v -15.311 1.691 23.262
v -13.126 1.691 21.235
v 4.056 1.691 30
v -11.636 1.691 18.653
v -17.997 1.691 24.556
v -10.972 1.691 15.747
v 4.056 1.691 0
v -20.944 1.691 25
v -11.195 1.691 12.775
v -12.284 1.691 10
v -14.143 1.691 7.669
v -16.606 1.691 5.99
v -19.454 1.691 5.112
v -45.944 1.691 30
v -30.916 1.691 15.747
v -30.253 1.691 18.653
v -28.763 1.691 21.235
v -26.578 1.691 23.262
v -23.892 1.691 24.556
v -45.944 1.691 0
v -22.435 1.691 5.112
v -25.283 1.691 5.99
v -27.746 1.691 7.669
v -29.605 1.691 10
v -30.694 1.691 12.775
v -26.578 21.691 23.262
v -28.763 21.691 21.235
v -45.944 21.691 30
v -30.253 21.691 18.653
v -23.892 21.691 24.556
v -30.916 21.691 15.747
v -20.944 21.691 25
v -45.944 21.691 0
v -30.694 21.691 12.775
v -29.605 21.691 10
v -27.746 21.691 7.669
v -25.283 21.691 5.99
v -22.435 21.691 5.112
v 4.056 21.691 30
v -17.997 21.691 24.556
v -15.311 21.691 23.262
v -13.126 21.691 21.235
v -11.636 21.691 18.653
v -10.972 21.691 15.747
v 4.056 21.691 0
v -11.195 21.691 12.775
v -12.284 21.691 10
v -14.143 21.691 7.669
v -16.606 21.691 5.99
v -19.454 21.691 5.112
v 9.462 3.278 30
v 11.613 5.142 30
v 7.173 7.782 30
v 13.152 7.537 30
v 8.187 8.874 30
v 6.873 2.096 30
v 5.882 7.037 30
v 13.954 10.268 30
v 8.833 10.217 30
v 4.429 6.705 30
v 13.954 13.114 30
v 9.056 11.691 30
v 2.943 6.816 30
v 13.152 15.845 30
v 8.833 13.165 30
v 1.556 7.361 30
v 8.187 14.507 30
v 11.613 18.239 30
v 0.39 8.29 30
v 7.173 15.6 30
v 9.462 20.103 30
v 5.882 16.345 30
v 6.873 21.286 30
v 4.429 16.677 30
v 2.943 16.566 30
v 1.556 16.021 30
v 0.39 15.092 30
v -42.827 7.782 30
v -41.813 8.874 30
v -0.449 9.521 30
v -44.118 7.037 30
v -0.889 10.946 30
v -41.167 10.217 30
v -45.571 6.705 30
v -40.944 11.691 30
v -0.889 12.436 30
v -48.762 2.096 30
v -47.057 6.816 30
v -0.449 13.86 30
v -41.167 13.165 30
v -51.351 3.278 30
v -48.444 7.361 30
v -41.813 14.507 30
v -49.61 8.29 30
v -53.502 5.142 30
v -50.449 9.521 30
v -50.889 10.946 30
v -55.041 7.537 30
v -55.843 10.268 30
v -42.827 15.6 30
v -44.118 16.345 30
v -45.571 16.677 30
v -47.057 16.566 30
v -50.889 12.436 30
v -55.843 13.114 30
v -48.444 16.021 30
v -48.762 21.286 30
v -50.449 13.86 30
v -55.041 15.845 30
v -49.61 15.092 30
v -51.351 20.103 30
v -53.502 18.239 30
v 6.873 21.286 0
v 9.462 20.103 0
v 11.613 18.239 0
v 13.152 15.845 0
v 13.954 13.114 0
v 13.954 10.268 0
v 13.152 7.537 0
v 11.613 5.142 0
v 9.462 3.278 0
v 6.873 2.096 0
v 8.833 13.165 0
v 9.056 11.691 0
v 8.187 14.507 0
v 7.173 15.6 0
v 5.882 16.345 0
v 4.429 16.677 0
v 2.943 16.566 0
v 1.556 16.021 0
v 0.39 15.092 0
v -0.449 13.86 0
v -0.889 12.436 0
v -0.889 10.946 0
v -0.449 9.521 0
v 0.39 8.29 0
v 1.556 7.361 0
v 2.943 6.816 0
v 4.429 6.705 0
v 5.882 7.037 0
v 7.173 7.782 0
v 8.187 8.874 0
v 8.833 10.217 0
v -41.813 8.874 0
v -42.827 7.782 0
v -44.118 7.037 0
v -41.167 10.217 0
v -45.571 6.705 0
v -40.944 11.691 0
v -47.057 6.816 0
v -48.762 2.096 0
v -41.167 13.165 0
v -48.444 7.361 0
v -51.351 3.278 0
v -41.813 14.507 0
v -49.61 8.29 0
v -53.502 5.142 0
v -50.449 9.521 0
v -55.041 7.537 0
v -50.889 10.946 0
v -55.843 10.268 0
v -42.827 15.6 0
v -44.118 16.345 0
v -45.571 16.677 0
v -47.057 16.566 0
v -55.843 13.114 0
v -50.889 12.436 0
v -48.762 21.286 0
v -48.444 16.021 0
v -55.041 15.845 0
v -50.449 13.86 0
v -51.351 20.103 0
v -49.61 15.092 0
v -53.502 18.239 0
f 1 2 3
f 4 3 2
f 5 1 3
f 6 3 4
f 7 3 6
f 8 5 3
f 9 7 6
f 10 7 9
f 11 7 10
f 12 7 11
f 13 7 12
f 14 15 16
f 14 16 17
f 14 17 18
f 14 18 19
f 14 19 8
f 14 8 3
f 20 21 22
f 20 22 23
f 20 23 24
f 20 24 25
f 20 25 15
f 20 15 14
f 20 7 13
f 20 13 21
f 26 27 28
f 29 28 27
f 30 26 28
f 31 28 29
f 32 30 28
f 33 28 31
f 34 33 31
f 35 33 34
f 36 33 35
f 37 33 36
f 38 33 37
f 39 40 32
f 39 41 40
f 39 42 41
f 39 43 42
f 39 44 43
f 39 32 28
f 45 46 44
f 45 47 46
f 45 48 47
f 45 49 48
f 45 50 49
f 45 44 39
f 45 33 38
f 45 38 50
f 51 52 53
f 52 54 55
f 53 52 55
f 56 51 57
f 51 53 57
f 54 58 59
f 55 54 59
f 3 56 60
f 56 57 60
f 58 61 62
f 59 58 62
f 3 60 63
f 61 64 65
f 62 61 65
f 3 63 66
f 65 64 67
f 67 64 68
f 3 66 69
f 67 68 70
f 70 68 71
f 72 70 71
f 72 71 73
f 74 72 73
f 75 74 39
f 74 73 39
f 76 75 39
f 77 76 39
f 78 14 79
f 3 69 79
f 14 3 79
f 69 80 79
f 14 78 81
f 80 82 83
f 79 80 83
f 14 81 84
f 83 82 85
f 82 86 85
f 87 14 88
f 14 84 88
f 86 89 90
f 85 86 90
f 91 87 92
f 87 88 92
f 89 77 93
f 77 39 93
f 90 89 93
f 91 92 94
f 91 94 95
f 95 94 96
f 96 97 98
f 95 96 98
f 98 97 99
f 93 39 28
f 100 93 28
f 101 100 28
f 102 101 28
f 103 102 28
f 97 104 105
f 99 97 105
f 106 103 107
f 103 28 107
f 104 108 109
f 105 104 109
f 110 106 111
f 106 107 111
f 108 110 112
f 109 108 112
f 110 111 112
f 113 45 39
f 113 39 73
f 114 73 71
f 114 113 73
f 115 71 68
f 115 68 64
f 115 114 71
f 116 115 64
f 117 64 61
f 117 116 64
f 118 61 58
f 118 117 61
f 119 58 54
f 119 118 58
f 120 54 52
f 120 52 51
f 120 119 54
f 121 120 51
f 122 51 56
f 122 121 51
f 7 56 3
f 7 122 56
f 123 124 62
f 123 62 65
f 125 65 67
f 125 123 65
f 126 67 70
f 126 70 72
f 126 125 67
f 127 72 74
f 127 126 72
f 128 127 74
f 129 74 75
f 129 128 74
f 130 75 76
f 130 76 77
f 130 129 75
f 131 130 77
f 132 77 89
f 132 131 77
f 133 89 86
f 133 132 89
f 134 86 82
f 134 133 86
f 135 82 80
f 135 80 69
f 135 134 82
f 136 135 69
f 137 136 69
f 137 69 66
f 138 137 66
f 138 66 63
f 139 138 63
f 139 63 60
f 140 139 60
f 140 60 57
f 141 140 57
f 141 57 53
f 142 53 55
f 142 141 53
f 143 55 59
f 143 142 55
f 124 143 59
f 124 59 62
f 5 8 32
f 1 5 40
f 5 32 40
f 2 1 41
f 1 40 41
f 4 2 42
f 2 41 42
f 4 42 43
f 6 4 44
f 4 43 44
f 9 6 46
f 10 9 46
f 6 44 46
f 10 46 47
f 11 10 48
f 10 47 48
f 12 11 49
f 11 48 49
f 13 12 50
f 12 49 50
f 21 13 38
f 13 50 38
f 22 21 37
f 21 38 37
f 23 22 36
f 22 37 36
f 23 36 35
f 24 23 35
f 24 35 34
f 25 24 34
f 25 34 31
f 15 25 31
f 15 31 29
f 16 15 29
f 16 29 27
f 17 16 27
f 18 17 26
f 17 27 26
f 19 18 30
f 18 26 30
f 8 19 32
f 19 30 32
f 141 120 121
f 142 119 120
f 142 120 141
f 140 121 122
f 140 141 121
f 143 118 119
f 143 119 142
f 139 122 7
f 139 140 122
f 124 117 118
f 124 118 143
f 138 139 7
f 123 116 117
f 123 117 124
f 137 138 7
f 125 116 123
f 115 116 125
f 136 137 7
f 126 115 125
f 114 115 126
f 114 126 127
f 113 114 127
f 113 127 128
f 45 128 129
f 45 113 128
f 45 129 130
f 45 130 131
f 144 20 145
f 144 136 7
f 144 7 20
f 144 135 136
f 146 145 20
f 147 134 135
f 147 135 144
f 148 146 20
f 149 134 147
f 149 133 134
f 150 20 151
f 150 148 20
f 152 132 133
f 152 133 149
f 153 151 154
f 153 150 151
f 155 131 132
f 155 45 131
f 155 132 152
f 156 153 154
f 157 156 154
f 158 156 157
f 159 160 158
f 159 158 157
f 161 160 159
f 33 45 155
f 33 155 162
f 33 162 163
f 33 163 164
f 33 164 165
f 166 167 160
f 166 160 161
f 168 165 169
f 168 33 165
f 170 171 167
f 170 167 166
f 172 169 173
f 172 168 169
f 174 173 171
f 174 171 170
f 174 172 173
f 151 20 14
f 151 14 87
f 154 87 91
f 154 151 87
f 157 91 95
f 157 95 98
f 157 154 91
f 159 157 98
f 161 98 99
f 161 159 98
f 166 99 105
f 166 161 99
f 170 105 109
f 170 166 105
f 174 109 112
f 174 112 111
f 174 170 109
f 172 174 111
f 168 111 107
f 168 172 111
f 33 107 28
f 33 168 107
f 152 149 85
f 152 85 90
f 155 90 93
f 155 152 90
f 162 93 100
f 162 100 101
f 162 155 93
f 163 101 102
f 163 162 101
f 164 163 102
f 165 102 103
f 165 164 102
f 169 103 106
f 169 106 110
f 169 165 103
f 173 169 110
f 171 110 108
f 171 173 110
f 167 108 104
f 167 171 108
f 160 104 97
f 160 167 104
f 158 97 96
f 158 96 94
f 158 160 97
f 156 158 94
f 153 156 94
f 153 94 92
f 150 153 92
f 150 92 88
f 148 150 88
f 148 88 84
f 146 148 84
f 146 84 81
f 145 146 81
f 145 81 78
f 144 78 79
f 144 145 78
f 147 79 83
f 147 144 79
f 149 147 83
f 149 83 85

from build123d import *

# Parameters (mm, degrees)
IZIM2_R                     = 5
Y_KSEKLIK_EKSTR_ZYON2_DEPTH = 30
IZIM3_R                     = 10
KES_EKSTR_ZYON1_DEPTH       = 20


with BuildPart() as part:
    # Çizim2 → Yükseklik-Ekstrüzyon2 (new body)
    with BuildSketch(Plane.XY):
        with BuildLine():
            Line((-45.944380081, 21.690872668), (4.055619919, 21.690872668))
            ThreePointArc((4.055619919, 21.690872668), (14.055619919, 11.690872668), (4.055619919, 1.690872668))
            Line((4.055619919, 1.690872668), (-45.944380081, 1.690872668))
            ThreePointArc((-45.944380081, 1.690872668), (-55.944380081, 11.690872668), (-45.944380081, 21.690872668))
        make_face()
        with Locations((-45.944380081, 11.690872668)):
            Circle(IZIM2_R, mode=Mode.SUBTRACT)
        with Locations((4.055619919, 11.690872668)):
            Circle(IZIM2_R, mode=Mode.SUBTRACT)
    extrude(amount=Y_KSEKLIK_EKSTR_ZYON2_DEPTH)

    # Çizim3 → Kes-Ekstrüzyon1 (cut)
    with BuildSketch(Plane(origin=(0, 21.690872668, 0), x_dir=(1, 0, 0), z_dir=(0, 1, 0))):
        with Locations(Location((-20.944380081, -15, 0), (0, 0, 270))):
            Circle(IZIM3_R)
    extrude(amount=-KES_EKSTR_ZYON1_DEPTH, mode=Mode.SUBTRACT)


solid = part.part
